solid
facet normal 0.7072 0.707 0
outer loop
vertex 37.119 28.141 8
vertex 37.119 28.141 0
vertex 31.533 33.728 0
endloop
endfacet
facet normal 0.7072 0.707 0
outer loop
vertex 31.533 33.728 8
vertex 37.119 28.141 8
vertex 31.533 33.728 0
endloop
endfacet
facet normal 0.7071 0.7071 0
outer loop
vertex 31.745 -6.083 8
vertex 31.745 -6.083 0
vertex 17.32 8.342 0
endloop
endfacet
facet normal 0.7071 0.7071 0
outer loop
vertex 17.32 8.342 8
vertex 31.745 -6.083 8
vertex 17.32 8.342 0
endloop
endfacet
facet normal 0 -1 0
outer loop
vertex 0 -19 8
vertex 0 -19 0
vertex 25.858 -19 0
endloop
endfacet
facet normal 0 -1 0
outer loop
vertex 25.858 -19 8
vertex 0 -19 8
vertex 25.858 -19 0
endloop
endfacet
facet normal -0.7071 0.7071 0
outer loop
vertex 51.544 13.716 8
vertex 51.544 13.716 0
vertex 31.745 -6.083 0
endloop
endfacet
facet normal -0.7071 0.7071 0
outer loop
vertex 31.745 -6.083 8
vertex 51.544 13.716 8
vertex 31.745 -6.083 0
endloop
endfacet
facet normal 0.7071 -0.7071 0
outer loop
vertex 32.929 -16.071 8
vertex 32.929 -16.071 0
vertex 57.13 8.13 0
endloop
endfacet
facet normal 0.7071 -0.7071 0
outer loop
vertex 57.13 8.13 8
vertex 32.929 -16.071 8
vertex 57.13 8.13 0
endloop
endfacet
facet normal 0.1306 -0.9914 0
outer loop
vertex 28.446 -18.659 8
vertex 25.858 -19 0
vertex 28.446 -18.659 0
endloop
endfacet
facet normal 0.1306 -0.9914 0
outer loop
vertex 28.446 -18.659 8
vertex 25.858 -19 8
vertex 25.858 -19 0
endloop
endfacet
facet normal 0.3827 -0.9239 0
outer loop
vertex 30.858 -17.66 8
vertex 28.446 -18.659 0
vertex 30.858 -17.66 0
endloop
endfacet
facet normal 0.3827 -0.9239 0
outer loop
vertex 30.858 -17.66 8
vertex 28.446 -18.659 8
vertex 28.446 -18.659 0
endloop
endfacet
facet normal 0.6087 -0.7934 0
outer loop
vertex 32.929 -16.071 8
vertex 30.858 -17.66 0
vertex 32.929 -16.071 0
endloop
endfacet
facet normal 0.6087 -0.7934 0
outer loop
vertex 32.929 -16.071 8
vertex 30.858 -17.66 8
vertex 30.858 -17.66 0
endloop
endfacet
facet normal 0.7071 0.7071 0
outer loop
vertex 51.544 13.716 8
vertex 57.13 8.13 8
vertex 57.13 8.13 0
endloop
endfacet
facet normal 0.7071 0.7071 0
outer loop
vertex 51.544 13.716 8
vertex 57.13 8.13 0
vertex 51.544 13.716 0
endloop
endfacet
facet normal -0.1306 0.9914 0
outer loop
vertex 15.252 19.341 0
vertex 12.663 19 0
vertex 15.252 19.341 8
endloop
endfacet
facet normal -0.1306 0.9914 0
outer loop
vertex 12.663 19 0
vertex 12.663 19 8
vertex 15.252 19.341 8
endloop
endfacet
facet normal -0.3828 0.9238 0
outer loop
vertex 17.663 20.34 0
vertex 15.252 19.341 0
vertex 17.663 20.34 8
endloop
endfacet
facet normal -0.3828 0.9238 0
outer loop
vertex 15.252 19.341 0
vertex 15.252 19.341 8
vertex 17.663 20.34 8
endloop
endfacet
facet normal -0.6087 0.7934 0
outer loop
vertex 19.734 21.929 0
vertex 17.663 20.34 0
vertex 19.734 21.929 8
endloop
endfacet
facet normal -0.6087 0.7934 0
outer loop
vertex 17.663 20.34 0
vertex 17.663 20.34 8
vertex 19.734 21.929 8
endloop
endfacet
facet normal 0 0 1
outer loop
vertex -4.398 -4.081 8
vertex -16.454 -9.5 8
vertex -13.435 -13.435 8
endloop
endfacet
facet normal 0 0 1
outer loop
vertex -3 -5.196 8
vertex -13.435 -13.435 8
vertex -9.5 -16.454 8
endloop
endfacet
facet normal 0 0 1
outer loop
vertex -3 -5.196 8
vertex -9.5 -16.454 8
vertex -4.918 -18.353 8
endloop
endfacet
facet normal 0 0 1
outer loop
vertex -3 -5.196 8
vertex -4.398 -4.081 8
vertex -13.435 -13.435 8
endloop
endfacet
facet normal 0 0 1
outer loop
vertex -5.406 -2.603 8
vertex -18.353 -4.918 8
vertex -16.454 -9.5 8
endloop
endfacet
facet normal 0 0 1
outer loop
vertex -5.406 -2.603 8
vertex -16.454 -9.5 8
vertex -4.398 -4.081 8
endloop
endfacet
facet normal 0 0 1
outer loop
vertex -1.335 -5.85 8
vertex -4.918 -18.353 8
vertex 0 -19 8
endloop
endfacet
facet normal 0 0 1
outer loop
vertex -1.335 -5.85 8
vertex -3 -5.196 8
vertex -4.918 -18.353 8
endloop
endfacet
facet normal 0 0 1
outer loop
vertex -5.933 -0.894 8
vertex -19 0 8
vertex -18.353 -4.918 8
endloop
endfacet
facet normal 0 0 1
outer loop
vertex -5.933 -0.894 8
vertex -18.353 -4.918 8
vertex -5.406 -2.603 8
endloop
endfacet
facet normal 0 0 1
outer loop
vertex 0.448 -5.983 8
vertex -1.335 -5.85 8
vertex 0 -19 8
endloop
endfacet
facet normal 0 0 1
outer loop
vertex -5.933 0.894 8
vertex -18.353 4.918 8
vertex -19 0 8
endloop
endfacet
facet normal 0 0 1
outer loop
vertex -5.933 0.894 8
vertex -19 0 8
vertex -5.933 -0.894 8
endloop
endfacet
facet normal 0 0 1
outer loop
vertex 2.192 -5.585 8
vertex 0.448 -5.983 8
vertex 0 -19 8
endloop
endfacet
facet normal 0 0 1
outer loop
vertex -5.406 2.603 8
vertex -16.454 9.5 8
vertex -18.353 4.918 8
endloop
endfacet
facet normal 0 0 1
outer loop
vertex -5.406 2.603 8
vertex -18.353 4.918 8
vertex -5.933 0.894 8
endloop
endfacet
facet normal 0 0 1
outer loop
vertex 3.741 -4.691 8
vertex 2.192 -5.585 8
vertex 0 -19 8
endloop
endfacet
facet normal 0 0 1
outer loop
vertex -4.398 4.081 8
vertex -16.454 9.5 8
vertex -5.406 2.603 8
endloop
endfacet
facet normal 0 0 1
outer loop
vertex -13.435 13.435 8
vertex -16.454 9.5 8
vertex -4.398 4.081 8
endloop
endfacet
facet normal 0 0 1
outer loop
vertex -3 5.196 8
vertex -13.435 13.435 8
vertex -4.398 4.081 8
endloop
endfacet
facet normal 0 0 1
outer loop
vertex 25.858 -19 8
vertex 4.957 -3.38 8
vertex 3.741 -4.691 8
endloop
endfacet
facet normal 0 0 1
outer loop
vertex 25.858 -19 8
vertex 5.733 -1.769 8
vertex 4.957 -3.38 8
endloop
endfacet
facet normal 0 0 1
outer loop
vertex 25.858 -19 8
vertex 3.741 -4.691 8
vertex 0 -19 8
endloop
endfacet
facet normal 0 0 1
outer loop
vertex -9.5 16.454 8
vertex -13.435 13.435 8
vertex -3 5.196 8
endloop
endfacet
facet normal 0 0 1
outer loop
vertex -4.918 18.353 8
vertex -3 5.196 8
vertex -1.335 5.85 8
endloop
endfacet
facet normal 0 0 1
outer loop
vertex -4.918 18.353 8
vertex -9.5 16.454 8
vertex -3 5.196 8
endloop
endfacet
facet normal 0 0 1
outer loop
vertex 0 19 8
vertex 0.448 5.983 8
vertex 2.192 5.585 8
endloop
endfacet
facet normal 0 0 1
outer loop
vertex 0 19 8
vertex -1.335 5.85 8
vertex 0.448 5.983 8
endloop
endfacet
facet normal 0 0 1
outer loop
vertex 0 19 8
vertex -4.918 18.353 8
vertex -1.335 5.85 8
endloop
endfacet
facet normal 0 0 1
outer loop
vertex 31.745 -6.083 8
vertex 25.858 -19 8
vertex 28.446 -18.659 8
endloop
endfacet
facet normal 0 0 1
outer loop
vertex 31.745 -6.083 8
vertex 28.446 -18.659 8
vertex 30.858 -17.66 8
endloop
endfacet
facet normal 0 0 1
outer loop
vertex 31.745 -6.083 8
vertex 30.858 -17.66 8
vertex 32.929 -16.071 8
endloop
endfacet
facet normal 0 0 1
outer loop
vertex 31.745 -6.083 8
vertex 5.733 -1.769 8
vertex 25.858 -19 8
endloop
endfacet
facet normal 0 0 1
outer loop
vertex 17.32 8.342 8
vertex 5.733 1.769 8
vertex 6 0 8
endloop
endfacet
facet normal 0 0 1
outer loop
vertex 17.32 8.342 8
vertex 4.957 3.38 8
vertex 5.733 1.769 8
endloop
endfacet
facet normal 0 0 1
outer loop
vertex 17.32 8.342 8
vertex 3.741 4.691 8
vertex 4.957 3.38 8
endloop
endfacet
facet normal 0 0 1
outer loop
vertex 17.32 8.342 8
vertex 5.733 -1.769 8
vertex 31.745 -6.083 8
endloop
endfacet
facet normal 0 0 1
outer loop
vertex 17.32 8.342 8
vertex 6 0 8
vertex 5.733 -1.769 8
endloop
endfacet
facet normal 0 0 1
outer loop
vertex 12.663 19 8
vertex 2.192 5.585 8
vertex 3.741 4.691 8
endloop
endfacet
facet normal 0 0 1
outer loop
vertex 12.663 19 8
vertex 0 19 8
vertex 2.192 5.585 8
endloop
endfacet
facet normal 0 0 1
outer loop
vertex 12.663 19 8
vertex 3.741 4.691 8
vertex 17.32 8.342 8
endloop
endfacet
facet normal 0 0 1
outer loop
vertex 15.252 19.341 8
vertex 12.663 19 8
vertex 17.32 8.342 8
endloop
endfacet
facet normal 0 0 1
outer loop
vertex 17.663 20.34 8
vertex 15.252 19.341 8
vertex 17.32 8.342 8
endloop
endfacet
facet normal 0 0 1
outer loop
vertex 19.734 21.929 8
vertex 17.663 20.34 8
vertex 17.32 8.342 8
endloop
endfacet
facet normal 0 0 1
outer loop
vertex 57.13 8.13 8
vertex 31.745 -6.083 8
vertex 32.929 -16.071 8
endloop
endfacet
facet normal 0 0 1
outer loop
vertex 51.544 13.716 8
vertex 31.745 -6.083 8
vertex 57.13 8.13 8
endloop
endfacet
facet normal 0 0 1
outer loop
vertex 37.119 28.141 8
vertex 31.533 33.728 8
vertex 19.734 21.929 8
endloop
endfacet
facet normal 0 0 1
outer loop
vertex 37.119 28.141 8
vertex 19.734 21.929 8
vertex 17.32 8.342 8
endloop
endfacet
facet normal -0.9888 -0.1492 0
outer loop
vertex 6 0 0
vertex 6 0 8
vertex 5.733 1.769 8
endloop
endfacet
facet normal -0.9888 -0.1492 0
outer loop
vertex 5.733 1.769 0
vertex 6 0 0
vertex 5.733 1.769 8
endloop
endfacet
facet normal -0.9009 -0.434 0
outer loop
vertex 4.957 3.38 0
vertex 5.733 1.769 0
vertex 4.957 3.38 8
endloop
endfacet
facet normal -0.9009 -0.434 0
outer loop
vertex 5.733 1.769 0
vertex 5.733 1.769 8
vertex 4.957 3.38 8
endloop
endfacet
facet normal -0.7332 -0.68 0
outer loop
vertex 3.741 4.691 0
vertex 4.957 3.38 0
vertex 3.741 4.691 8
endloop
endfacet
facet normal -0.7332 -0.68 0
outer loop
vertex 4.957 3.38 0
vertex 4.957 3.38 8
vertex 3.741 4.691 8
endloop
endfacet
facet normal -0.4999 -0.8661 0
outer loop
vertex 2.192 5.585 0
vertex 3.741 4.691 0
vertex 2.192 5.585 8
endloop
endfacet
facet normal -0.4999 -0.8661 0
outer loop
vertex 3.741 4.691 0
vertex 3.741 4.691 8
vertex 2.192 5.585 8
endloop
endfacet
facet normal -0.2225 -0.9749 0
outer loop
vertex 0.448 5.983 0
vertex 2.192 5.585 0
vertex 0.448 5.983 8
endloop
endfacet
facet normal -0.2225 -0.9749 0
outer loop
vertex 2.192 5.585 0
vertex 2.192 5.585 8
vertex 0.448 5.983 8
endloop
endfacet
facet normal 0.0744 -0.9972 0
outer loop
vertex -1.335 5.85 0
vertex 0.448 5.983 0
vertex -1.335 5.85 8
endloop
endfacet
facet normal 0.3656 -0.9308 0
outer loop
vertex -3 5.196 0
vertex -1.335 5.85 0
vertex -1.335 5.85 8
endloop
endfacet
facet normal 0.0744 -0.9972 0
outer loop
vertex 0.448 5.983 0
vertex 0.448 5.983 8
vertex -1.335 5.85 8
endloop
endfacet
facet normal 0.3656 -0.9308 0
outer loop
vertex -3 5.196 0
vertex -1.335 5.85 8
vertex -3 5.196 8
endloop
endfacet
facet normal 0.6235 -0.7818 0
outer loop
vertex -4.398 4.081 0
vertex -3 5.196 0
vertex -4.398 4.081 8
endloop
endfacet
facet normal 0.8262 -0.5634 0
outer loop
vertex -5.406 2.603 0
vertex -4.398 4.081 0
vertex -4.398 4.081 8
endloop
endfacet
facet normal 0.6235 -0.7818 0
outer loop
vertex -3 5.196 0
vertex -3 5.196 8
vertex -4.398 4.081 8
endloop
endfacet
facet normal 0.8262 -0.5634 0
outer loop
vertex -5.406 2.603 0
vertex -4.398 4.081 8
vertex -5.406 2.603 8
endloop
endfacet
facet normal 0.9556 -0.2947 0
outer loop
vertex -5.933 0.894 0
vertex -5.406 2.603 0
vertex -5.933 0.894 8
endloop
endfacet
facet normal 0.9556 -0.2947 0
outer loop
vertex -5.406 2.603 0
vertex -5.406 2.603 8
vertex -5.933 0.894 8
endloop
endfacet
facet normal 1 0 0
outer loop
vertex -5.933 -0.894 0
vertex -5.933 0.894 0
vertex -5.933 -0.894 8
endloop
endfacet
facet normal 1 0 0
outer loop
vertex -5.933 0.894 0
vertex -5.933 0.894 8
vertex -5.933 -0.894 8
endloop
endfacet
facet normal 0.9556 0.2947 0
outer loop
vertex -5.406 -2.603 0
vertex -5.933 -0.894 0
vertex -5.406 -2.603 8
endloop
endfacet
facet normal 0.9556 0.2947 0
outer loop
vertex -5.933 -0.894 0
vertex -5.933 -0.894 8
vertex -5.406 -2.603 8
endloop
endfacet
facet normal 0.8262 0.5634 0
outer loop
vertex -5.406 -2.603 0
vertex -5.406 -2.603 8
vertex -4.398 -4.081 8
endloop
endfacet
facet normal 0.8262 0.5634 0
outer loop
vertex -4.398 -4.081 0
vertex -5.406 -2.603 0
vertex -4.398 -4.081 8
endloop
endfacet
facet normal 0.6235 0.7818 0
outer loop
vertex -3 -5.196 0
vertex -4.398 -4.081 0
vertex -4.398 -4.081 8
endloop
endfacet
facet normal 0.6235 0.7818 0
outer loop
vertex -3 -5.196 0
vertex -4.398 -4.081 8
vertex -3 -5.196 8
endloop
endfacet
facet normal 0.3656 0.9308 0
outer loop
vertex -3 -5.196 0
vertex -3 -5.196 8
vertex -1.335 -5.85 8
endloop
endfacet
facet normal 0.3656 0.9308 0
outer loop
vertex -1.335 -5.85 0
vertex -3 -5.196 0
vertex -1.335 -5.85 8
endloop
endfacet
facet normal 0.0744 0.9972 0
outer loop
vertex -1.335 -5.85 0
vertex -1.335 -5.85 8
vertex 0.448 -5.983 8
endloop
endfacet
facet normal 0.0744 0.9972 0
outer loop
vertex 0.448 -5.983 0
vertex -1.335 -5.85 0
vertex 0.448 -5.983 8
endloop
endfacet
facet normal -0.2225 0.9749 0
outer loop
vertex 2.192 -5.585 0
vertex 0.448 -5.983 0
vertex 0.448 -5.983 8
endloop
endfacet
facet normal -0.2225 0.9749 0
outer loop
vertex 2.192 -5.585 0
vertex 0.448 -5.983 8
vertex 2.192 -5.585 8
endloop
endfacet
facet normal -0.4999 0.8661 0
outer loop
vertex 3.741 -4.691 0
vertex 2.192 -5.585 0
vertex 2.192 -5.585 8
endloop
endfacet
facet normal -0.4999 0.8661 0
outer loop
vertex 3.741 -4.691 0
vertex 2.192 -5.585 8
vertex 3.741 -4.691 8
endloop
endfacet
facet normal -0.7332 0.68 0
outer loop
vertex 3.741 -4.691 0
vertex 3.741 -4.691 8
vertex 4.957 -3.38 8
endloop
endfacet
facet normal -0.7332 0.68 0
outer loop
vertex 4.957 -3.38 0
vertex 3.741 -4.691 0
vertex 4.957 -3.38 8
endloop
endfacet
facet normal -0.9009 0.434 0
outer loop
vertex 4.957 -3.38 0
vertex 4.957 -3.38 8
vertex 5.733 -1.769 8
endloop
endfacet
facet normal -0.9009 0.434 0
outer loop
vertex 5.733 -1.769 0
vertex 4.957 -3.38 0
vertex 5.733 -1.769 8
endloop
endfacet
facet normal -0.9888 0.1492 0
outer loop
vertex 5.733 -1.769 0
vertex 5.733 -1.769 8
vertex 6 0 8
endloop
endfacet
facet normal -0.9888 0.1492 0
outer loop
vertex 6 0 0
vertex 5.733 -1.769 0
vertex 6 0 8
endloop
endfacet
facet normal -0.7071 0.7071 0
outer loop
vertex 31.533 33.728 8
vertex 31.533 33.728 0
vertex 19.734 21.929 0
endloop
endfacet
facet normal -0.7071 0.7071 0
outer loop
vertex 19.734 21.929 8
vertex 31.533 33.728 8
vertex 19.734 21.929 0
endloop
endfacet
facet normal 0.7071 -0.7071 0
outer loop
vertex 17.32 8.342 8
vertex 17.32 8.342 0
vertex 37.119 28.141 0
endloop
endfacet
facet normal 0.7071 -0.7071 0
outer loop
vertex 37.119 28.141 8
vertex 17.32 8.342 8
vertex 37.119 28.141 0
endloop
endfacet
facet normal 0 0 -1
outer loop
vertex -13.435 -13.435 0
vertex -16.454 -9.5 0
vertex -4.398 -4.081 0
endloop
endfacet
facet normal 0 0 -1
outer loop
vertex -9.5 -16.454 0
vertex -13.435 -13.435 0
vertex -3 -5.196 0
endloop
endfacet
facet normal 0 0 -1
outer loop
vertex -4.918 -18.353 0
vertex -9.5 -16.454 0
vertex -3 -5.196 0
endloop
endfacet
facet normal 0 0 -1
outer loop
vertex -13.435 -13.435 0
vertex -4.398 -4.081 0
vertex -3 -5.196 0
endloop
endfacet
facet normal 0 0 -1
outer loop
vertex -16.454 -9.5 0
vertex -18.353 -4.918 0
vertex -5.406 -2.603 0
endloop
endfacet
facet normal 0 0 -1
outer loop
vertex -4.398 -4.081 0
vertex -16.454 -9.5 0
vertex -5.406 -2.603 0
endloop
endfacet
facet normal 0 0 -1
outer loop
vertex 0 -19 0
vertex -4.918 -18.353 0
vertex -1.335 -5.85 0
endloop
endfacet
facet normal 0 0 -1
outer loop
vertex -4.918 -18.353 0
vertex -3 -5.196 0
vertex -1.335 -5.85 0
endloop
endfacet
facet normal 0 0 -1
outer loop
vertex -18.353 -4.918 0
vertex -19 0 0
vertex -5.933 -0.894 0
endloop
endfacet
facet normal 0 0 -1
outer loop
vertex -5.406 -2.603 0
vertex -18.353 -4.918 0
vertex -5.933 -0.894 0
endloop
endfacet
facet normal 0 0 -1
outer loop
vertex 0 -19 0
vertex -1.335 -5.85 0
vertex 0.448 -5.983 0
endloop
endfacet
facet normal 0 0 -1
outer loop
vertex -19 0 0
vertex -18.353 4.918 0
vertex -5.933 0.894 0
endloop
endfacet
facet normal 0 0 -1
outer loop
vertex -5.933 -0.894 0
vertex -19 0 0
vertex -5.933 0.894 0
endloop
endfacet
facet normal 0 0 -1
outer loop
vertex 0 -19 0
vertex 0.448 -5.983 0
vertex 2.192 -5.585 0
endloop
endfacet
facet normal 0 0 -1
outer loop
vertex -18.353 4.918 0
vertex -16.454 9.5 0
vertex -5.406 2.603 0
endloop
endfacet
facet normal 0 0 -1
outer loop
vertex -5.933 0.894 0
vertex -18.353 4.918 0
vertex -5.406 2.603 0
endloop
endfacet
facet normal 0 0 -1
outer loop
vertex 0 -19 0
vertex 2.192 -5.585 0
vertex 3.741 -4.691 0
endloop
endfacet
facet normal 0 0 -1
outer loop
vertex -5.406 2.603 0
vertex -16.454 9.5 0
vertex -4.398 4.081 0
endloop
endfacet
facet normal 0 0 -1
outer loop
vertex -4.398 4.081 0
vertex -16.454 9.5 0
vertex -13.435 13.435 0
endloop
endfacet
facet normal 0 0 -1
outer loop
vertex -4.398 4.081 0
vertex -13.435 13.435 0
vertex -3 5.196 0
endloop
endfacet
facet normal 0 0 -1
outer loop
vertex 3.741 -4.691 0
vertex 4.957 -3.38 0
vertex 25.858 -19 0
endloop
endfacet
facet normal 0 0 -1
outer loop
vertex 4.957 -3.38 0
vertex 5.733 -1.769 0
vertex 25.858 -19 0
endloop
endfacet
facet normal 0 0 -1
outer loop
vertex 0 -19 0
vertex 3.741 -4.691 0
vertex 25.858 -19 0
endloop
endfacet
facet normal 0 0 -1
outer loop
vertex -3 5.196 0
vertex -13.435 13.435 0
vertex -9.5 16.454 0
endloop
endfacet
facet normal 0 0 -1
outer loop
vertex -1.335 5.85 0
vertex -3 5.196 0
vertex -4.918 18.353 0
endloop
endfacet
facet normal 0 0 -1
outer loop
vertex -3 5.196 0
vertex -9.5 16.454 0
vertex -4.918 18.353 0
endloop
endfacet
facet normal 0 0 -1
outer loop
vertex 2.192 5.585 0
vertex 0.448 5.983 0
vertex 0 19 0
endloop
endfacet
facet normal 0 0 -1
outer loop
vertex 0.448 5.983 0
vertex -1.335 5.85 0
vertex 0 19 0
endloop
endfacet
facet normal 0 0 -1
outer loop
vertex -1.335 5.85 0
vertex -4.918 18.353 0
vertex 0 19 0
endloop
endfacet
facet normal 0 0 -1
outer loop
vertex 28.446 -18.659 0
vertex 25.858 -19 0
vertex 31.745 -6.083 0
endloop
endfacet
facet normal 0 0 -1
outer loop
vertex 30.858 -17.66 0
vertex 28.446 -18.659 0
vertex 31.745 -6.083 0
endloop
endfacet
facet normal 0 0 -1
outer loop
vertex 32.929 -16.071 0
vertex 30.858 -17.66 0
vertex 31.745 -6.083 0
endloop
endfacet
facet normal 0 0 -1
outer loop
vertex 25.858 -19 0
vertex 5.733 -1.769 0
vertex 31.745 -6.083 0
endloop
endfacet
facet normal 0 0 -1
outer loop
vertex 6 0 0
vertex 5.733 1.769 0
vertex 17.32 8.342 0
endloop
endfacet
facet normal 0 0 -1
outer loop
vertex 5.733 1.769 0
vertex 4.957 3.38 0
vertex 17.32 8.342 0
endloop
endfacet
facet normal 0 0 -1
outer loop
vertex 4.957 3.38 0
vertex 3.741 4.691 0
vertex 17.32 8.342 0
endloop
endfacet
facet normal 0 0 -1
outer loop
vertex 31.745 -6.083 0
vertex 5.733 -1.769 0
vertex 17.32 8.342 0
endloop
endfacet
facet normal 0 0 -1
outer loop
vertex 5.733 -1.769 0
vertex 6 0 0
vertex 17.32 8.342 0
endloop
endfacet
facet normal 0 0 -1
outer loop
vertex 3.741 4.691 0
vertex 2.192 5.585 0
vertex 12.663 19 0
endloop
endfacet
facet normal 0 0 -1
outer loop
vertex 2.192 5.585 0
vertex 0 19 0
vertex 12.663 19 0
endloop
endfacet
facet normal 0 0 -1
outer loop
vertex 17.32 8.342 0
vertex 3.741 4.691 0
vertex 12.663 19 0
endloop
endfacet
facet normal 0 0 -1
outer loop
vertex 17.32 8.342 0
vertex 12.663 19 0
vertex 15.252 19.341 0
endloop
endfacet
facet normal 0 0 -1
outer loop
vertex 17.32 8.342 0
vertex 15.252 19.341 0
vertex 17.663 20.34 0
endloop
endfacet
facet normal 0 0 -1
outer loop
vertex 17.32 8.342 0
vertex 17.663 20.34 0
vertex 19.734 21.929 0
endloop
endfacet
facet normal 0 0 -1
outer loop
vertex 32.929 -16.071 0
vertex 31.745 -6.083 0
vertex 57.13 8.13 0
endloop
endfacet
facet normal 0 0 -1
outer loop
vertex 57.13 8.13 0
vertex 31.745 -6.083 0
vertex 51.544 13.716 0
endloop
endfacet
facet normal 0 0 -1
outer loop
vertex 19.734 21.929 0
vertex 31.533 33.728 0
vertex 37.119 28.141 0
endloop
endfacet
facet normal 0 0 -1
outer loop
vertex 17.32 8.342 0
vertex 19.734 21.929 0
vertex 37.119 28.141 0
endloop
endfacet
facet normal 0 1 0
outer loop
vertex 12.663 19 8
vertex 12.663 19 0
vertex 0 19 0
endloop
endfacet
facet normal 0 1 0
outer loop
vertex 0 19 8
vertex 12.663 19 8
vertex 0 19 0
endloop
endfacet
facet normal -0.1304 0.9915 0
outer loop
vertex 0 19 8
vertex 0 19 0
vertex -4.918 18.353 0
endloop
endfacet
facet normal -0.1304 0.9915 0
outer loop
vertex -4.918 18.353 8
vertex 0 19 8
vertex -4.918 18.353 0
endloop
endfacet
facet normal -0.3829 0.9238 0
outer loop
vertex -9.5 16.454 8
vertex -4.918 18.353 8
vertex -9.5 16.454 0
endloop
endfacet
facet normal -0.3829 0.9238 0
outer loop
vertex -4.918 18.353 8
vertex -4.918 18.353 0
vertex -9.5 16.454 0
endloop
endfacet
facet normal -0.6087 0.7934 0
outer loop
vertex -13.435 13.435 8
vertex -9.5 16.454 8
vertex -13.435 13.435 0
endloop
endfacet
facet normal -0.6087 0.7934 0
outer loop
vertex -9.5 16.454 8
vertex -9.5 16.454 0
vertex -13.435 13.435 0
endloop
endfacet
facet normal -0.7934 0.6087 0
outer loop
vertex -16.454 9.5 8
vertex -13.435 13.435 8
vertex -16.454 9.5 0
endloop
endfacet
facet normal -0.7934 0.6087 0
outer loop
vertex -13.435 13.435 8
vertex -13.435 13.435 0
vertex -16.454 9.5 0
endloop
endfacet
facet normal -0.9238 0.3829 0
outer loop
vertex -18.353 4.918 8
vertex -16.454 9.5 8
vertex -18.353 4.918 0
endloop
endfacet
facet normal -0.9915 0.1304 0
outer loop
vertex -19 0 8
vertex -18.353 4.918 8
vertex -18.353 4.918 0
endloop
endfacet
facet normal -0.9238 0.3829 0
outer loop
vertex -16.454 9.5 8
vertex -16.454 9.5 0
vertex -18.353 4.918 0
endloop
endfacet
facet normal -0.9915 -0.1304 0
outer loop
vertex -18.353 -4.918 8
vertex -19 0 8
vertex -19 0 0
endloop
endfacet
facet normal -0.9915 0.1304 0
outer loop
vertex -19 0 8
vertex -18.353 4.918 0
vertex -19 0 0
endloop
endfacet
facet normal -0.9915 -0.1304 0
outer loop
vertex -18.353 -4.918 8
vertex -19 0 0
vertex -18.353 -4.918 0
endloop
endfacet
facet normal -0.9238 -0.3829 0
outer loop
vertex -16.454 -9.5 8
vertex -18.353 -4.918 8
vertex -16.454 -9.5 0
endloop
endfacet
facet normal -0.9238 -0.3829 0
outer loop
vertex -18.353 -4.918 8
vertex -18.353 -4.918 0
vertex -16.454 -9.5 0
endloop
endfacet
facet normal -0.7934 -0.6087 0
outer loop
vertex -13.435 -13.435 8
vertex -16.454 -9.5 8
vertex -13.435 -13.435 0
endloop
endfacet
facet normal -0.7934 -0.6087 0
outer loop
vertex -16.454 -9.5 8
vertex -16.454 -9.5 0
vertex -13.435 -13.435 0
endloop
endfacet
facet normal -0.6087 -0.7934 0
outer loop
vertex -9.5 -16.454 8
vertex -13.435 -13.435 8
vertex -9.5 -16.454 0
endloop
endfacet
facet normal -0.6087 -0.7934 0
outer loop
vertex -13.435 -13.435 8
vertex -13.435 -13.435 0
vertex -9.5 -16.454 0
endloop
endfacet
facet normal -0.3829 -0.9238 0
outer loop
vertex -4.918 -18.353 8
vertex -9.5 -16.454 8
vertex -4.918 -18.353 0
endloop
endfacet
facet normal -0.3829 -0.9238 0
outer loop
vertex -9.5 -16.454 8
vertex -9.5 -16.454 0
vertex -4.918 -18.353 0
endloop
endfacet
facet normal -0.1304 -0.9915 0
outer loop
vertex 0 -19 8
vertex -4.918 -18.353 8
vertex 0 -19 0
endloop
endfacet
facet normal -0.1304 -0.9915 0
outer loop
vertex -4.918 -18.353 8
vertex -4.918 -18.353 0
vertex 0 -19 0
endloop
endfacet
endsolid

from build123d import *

# Parameters (mm, degrees)
SKETCH1_R           = 2.5
BOSS_EXTRUDE1_DEPTH = 8
SKETCH2_R           = 1.5
CUT_EXTRUDE1_DEPTH  = 77.487541414
FILLET1_R           = 10
SKETCH3_R           = 6
CUT_EXTRUDE2_DEPTH  = 77.487541414


with BuildPart() as part:
    # Sketch1 → Boss-Extrude1 (new body)
    with BuildSketch(Plane.XY):
        with BuildLine():
            Line((0, -19), (30, -19))
            Line((30, -19), (64.201367261, 15.201367261))
            Line((64.201367261, 15.201367261), (58.615223689, 20.787510832))
            Line((58.615223689, 20.787510832), (31.745166004, -6.082546853))
            Line((31.745166004, -6.082546853), (17.320187668, 8.342431483))
            Line((17.320187668, 8.342431483), (44.190245353, 35.212489168))
            Line((44.190245353, 35.212489168), (38.604101782, 40.798632739))
            Line((38.604101782, 40.798632739), (16.805469042, 19))
            Line((16.805469042, 19), (0, 19))
            ThreePointArc((0, 19), (-19, 0), (0, -19))
        make_face()
        Circle(SKETCH1_R, mode=Mode.SUBTRACT)
    extrude(amount=BOSS_EXTRUDE1_DEPTH)

    # Sketch2 → Cut-Extrude1 (cut, through all)
    with BuildSketch(Plane.XY.offset(8)):
        with Locations((38.878105659, 35.574881393)):
            Circle(SKETCH2_R)
        with Locations((58.977615915, 15.475371138)):
            Circle(SKETCH2_R)
    extrude(amount=-CUT_EXTRUDE1_DEPTH, mode=Mode.SUBTRACT)

    # Fillet1
    fillet1_edges = [part.edges().sort_by_distance(p)[0] for p in [
        (30, -19, 4),
        (16.805469042, 19, 4),
    ]]
    fillet(fillet1_edges, radius=FILLET1_R)

    # Sketch3 → Cut-Extrude2 (cut, through all)
    with BuildSketch(Plane.XY.offset(8)):
        Circle(SKETCH3_R)
        Polygon((38.604101782, 40.798632739), (64.201367261, 15.201367261), (57.130299449, 8.130299449), (31.53303397, 33.727564928), align=None)
    extrude(amount=-CUT_EXTRUDE2_DEPTH, mode=Mode.SUBTRACT)


solid = part.part
